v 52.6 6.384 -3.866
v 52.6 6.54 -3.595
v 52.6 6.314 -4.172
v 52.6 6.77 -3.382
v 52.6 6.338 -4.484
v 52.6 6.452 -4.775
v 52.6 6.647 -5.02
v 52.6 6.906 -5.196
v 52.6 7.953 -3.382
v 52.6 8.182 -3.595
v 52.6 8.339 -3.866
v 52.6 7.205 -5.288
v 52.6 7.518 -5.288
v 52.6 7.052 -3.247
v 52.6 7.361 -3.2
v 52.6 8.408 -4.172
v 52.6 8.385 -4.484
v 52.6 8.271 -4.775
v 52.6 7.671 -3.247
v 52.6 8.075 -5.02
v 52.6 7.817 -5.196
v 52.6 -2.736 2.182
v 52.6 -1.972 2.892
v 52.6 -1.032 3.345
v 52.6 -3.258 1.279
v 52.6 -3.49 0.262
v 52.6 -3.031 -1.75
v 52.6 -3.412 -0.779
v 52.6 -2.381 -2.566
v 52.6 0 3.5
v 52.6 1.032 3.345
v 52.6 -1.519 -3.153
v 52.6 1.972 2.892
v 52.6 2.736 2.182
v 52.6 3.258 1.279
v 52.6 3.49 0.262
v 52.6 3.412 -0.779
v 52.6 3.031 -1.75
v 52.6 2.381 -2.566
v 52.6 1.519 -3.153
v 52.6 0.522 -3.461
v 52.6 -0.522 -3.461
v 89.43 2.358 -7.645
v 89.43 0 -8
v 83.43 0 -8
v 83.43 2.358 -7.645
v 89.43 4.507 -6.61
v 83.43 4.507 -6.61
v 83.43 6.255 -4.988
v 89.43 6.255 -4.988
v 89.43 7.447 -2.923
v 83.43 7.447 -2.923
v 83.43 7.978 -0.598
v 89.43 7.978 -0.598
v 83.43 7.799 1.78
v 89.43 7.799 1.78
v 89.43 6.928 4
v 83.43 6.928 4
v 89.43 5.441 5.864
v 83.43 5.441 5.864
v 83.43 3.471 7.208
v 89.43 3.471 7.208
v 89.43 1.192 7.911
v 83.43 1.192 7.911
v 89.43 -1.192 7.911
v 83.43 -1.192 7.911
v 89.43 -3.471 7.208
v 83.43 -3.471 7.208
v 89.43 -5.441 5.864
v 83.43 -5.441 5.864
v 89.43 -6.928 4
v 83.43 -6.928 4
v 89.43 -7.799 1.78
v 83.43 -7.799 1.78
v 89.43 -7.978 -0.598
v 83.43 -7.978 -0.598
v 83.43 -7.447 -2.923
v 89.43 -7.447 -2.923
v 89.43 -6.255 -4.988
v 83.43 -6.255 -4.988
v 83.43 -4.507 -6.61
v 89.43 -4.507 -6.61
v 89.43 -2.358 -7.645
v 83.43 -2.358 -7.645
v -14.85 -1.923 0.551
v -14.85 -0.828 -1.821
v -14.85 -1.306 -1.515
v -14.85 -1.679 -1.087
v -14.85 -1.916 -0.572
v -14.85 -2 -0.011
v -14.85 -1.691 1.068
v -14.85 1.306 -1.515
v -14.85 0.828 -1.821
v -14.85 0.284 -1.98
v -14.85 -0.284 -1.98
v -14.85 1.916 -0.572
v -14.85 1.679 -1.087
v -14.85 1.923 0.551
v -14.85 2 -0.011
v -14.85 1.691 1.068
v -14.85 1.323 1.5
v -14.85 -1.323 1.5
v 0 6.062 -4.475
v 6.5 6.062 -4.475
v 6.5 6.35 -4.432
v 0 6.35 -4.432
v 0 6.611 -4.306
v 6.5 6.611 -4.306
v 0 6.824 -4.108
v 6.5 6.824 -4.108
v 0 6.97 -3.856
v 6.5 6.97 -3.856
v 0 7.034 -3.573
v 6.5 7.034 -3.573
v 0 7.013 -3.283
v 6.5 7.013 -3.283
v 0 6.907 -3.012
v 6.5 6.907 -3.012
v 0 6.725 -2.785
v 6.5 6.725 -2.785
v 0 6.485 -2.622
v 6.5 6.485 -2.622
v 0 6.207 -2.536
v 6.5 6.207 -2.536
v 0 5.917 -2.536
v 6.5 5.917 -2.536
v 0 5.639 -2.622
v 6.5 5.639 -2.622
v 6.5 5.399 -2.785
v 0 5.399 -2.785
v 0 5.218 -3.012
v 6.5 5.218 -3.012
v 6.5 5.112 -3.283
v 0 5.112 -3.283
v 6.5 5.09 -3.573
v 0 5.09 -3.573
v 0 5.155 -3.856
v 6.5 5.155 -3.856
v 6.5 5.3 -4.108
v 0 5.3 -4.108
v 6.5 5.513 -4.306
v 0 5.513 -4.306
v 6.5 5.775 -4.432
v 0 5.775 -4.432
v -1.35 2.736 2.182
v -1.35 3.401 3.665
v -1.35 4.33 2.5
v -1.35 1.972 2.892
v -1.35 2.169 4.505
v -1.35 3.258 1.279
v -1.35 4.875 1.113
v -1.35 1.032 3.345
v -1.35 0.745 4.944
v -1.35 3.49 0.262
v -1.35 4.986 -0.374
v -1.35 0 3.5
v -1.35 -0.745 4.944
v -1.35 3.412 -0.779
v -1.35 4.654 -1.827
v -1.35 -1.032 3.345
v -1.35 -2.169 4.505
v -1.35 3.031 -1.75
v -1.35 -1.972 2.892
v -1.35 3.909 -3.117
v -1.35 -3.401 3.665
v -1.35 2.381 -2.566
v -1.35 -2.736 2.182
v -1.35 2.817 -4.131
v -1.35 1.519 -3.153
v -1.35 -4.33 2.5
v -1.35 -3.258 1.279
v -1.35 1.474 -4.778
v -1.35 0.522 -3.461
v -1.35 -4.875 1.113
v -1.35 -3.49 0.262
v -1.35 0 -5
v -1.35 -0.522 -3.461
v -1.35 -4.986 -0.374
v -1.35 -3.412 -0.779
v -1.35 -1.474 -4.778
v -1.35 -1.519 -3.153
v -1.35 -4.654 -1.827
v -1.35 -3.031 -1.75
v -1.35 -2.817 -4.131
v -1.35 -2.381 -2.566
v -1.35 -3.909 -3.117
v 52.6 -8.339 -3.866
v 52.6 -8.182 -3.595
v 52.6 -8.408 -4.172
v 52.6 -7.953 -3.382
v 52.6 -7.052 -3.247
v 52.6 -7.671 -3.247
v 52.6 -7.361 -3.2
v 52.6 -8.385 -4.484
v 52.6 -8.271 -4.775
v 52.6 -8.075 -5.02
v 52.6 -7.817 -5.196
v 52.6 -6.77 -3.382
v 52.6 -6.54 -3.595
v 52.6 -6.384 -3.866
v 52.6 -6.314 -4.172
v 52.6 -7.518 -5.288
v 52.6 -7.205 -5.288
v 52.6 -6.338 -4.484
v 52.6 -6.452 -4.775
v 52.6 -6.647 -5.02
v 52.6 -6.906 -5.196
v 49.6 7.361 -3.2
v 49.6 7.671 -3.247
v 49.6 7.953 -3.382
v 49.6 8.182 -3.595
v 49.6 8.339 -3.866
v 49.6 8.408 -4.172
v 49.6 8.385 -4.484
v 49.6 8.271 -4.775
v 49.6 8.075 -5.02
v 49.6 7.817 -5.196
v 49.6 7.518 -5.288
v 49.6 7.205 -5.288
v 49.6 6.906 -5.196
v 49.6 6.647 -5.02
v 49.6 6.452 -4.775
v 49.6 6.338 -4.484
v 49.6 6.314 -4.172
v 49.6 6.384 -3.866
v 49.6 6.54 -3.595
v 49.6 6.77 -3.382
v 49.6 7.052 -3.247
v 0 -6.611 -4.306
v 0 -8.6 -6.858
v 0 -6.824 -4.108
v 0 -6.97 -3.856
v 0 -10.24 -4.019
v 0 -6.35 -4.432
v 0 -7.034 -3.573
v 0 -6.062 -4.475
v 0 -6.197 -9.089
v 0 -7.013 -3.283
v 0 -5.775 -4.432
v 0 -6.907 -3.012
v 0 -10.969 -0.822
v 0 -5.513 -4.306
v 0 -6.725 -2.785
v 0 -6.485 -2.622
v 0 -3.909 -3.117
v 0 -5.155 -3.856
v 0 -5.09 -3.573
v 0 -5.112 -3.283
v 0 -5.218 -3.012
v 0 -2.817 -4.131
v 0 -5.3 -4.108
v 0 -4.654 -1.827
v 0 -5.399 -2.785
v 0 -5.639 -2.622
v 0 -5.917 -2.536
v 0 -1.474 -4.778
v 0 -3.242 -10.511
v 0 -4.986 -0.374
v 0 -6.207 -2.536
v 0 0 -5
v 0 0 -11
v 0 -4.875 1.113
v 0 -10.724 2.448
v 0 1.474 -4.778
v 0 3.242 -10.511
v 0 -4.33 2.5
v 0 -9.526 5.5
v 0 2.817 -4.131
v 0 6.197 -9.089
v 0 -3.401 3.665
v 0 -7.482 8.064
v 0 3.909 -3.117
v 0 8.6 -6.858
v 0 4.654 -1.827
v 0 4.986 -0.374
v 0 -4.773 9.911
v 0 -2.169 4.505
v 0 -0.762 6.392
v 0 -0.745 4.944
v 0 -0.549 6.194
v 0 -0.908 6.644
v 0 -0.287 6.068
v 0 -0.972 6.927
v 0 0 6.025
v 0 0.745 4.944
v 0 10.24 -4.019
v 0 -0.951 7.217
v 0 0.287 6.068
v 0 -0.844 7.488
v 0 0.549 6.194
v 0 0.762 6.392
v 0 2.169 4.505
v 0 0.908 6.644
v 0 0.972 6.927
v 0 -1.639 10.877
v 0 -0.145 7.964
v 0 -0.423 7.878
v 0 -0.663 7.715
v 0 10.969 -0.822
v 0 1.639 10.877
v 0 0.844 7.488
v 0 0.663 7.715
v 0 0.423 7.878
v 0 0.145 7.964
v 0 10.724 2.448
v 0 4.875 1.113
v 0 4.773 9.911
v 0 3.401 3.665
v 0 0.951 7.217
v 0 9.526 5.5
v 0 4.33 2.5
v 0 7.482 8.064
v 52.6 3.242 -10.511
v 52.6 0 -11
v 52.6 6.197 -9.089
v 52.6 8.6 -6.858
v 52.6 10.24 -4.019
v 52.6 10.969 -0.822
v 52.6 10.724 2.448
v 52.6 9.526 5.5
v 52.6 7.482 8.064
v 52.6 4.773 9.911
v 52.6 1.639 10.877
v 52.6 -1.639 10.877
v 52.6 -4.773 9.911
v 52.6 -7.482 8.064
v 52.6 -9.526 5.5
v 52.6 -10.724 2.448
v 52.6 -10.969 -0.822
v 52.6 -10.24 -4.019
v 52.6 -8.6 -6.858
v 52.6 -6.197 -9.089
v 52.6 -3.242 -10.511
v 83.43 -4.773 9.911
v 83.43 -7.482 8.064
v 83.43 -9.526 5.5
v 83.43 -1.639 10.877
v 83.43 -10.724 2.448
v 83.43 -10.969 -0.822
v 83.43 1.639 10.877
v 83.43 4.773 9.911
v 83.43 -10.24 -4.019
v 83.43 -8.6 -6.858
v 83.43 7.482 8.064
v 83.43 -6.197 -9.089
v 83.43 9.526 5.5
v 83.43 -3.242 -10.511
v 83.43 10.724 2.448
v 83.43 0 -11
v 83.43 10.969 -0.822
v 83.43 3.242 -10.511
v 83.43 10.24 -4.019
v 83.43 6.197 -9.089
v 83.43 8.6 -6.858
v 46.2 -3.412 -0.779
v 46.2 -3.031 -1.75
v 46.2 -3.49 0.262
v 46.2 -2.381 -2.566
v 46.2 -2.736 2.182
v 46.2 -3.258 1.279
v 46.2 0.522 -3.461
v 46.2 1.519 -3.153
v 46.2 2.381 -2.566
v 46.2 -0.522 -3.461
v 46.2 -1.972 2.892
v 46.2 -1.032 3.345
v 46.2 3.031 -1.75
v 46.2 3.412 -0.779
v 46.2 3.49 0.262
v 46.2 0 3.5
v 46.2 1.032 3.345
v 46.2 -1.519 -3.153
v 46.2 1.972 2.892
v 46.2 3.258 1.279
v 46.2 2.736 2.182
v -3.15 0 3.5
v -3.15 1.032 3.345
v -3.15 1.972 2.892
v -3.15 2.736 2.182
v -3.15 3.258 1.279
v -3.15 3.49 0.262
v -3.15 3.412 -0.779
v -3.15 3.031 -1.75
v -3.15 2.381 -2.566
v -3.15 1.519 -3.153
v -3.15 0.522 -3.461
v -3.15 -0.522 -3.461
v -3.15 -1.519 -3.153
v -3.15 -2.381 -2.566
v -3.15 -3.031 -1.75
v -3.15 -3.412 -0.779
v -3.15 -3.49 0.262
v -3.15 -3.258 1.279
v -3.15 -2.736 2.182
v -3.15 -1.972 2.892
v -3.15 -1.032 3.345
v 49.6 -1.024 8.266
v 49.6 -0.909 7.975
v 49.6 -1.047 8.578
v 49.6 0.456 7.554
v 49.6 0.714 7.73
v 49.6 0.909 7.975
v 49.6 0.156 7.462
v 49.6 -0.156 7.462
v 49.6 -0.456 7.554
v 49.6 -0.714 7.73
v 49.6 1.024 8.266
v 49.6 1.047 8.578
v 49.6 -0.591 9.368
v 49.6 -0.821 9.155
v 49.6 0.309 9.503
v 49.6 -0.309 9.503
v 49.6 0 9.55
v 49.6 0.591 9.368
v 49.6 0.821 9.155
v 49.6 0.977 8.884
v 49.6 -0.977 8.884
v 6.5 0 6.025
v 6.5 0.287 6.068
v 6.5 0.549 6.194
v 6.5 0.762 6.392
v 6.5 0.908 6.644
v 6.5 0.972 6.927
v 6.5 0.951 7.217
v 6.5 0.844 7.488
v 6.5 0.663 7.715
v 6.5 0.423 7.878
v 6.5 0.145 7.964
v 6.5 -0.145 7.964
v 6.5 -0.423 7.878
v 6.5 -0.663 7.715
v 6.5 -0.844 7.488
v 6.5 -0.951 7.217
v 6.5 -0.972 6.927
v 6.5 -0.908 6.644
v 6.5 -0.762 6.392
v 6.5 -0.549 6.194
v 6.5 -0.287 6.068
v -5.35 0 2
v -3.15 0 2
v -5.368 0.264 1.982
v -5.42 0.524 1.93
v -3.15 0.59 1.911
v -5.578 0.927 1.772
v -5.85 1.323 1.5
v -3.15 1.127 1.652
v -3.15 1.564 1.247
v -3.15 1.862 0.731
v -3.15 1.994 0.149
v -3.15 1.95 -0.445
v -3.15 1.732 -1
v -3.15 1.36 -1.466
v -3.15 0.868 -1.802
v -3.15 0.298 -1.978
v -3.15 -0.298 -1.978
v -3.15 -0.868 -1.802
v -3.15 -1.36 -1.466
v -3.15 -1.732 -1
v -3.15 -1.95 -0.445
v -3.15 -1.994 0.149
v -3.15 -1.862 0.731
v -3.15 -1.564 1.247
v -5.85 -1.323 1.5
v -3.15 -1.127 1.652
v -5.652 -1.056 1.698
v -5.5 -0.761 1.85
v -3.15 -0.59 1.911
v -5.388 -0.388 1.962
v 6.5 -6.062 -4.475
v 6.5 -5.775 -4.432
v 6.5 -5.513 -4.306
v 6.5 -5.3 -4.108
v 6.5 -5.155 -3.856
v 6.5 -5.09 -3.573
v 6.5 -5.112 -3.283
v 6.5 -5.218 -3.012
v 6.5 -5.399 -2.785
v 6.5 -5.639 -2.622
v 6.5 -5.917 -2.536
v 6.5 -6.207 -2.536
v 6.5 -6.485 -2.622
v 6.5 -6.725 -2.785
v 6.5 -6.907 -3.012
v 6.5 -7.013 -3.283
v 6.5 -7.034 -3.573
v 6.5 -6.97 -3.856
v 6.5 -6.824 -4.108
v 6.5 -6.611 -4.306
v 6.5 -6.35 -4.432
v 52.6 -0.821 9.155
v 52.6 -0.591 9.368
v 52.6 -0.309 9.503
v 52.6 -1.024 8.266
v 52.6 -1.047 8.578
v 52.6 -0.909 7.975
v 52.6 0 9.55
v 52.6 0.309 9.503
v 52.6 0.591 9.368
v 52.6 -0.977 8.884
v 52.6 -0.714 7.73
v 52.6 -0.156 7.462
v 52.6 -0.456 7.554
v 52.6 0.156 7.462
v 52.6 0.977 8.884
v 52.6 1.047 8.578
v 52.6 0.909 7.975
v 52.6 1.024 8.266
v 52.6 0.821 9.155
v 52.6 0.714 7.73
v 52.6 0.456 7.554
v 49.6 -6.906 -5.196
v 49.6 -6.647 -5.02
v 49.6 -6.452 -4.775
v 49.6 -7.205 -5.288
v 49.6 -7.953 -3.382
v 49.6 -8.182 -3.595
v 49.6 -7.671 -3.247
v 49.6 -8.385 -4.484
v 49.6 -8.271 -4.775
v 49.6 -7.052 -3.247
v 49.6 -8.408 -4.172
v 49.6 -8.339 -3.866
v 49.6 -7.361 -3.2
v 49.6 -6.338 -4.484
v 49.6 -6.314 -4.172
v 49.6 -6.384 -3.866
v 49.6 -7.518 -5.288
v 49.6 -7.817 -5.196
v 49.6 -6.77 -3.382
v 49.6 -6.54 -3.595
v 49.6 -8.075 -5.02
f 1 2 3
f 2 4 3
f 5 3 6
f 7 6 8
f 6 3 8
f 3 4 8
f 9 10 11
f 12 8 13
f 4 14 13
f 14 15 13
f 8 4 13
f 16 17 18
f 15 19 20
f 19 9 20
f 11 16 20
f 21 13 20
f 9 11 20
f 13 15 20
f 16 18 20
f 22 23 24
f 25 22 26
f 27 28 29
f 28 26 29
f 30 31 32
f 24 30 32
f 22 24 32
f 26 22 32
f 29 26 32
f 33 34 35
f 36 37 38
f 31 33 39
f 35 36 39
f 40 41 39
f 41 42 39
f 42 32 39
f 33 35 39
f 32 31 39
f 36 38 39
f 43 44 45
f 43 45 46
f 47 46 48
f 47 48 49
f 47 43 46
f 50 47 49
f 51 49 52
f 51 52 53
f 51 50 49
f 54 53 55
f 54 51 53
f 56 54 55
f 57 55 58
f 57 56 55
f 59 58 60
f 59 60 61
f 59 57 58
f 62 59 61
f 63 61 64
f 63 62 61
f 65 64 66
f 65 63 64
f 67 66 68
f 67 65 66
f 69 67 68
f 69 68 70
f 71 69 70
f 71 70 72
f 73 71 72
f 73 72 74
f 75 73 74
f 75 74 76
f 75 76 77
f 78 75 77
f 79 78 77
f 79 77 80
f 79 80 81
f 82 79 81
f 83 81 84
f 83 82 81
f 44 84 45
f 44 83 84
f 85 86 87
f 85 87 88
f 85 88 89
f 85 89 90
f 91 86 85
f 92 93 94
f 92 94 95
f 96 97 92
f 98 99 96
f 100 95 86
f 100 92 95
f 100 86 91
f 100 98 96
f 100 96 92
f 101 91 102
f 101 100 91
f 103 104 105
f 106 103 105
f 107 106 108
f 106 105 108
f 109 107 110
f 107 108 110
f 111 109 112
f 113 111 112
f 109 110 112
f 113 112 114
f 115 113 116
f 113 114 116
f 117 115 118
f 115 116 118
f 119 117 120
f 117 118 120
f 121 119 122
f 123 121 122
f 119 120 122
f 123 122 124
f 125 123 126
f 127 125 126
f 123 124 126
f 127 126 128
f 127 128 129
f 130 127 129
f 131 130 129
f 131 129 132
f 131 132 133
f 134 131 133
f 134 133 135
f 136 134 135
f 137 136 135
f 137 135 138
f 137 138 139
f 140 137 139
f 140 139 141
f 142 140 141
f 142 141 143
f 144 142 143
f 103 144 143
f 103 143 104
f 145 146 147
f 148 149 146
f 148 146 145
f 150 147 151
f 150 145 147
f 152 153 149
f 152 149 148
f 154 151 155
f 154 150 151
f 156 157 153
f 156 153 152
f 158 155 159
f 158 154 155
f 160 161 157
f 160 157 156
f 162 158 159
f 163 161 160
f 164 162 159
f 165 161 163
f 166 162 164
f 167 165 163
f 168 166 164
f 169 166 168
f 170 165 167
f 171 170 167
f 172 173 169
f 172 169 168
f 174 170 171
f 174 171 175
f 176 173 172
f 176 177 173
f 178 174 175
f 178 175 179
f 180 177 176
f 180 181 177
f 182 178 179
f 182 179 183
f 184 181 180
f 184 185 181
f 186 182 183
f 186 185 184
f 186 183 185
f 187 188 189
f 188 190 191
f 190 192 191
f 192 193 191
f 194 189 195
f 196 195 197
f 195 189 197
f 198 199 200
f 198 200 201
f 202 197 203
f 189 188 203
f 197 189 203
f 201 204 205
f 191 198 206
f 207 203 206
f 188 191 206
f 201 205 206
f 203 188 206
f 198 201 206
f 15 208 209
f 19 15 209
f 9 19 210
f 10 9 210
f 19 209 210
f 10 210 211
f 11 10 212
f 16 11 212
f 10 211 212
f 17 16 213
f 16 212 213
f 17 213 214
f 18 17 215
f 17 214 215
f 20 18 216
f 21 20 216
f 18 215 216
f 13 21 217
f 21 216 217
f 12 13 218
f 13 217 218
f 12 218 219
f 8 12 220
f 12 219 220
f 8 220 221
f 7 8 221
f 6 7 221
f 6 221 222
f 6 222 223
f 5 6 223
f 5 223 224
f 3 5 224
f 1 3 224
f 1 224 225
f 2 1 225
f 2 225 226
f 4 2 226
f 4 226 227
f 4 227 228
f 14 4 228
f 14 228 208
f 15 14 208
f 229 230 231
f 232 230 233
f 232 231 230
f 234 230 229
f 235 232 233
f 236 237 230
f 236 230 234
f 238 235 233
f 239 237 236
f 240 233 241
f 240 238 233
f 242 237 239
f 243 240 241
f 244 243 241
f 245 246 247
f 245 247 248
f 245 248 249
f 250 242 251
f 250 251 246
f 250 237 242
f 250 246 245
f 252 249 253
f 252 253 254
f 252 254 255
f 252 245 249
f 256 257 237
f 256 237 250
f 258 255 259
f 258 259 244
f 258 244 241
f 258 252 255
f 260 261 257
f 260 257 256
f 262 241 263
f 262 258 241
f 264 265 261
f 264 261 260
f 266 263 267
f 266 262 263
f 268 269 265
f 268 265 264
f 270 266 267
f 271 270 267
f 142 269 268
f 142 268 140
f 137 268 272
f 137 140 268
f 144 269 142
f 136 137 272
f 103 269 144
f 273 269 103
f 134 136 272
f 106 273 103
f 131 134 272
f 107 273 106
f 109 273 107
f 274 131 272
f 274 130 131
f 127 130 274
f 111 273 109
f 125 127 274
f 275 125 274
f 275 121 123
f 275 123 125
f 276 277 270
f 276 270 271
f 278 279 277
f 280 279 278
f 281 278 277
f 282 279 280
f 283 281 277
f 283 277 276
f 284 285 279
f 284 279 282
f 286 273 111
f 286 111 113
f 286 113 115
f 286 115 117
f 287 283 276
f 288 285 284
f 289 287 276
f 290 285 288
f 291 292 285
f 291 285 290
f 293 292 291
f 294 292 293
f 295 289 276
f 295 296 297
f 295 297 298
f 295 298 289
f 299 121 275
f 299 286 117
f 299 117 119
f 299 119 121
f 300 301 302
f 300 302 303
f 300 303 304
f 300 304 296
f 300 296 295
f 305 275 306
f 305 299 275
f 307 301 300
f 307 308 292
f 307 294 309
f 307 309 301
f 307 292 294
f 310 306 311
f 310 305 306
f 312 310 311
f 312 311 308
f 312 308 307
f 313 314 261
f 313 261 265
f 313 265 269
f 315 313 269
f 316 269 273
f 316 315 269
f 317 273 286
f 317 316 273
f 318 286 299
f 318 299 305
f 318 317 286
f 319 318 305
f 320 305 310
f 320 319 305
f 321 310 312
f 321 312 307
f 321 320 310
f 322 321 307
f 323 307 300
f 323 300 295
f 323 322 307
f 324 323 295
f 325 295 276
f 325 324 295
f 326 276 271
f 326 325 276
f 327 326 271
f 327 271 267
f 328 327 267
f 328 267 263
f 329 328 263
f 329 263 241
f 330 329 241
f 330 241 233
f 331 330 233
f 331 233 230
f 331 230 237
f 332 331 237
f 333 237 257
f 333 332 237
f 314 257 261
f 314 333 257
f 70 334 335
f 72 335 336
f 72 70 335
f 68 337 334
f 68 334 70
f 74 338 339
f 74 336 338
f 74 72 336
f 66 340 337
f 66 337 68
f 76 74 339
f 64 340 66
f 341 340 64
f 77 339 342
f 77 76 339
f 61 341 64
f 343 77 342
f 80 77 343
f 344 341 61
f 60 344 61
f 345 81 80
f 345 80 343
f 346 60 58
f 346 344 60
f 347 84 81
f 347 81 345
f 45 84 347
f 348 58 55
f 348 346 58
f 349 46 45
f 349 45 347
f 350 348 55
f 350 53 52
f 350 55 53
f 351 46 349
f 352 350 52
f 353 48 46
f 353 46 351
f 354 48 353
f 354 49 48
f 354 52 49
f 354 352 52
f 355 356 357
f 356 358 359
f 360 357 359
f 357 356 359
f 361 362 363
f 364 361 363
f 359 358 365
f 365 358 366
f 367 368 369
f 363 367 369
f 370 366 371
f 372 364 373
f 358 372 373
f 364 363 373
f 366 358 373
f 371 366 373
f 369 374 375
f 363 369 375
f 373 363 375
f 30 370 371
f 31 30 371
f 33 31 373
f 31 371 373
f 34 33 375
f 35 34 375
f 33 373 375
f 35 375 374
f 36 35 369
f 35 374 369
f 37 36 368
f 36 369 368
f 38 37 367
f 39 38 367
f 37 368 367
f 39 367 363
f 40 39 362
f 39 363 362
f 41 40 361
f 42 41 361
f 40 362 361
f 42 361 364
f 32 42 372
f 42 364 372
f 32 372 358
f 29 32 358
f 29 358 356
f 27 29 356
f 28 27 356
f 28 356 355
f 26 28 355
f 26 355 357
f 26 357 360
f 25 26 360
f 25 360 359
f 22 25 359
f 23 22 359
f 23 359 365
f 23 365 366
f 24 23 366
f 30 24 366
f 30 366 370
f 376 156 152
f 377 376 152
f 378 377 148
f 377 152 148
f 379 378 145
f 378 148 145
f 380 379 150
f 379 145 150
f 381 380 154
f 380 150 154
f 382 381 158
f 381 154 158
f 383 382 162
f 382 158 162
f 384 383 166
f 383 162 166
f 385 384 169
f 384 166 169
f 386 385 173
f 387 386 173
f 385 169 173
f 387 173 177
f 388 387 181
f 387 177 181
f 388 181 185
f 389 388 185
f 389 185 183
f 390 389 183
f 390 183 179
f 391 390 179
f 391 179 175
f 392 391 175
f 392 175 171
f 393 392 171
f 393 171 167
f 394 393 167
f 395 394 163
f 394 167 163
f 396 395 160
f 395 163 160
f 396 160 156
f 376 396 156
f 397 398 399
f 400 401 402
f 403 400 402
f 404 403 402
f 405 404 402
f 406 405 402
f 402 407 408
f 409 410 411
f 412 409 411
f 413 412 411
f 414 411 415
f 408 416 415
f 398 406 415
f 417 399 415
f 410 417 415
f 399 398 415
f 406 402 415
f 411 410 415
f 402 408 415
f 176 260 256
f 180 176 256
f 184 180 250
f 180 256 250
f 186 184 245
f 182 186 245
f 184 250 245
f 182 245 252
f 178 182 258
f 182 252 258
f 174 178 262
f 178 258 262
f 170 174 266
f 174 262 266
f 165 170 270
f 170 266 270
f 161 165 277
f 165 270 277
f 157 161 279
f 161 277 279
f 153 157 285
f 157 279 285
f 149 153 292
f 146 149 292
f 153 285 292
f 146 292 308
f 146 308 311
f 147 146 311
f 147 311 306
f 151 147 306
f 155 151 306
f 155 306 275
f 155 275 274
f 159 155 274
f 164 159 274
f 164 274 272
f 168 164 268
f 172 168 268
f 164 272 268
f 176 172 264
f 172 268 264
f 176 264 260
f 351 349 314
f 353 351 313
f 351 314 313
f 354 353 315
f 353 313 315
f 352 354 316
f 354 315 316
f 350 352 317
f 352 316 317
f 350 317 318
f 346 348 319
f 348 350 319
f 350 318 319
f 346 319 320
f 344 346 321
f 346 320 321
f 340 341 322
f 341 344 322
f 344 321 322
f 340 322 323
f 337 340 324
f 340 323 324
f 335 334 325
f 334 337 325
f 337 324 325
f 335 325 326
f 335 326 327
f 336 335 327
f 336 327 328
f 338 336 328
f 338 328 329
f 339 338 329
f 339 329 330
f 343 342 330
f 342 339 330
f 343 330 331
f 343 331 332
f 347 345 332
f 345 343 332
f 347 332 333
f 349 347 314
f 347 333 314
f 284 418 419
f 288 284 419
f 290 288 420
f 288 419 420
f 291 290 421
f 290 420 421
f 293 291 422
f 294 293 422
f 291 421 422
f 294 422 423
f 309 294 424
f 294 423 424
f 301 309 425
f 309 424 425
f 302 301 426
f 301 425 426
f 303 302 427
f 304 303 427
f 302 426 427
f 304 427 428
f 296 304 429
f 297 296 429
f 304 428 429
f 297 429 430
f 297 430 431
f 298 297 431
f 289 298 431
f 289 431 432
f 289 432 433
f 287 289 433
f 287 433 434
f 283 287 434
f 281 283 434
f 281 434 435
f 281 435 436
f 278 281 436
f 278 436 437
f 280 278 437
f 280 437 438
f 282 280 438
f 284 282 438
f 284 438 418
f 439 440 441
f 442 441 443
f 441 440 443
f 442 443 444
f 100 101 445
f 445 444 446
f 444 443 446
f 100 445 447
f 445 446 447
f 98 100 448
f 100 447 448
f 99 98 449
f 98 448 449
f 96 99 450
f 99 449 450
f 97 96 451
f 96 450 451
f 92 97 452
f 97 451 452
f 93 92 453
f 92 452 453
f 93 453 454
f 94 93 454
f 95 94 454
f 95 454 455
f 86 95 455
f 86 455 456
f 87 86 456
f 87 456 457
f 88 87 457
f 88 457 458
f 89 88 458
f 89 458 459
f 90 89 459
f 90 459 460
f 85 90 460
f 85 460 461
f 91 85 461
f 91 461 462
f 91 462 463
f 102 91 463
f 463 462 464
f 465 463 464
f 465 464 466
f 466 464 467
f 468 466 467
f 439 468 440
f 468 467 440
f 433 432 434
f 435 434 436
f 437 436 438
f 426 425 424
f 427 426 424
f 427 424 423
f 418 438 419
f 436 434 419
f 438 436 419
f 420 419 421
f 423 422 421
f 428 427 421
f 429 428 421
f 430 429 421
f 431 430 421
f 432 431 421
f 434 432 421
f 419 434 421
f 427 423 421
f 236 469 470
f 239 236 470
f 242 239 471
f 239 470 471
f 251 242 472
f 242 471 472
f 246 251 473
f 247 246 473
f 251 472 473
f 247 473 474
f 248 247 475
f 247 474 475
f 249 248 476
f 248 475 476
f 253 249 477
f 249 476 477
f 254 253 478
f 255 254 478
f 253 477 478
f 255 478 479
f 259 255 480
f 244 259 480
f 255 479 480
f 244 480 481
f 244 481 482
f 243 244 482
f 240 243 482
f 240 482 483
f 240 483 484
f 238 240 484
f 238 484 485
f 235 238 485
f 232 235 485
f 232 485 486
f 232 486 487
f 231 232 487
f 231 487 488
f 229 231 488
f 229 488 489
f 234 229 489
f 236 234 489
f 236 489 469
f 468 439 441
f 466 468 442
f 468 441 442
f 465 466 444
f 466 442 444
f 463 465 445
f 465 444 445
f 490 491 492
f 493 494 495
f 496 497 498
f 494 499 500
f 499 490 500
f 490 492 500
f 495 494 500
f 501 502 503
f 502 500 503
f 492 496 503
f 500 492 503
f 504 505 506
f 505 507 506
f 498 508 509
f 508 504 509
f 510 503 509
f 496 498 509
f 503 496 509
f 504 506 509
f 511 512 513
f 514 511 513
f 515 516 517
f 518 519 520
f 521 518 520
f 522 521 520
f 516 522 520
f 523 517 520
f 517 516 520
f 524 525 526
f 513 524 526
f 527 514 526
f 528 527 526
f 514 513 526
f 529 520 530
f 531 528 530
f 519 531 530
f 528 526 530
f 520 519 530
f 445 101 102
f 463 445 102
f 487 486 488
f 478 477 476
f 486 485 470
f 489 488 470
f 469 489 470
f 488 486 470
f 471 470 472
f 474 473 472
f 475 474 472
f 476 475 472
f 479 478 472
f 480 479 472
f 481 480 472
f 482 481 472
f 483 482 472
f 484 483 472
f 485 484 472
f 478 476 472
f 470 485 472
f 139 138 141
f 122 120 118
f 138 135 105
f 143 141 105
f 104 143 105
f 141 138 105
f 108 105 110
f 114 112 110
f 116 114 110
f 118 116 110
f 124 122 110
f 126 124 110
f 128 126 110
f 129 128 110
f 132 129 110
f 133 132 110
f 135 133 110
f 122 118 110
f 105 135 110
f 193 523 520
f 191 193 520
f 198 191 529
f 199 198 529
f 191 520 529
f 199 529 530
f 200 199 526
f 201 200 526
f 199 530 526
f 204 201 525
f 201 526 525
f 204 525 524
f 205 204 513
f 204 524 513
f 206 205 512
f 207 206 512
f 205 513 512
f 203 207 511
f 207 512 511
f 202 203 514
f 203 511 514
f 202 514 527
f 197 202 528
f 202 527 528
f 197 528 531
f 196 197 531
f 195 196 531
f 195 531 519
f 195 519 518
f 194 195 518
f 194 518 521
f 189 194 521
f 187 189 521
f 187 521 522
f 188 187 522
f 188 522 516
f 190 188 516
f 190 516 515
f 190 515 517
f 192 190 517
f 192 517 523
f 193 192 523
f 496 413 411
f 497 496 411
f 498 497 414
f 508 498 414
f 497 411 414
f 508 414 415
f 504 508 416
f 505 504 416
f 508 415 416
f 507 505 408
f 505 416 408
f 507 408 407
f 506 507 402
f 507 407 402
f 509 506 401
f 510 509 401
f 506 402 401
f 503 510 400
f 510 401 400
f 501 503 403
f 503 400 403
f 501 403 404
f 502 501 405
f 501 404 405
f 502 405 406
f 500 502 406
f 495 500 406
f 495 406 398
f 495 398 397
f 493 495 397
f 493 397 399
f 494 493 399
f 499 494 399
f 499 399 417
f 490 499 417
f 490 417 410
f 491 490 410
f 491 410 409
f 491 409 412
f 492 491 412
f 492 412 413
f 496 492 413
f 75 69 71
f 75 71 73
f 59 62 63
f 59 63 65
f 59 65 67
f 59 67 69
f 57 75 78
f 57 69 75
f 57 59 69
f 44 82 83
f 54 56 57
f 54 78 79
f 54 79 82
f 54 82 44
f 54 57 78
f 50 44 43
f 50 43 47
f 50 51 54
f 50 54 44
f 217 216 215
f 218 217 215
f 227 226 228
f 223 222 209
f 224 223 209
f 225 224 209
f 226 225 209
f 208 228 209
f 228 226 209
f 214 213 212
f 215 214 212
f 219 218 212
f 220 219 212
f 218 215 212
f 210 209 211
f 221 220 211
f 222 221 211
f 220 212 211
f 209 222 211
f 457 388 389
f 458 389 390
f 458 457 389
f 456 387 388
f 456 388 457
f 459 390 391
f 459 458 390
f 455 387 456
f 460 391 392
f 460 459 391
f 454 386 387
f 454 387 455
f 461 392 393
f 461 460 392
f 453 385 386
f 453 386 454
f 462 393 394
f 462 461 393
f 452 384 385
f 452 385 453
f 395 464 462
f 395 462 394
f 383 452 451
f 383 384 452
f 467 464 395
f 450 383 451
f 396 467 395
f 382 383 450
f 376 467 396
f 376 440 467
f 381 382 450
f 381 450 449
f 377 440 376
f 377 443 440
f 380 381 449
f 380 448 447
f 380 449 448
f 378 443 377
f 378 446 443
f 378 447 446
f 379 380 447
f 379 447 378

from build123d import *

# Parameters (mm, degrees)
SKETCH1_W           = 52.6
SKETCH1_H           = 11
SKETCH2_R           = 5
BOSS_EXTRUDE1_DEPTH = 1.35
SKETCH3_R           = 3.5
BOSS_EXTRUDE2_DEPTH = 1.8
SKETCH4_R           = 2
BOSS_EXTRUDE3_DEPTH = 11.7
CUT_EXTRUDE1_REACH  = 71.221
HOLE1_D             = 1.95
HOLE1_DEPTH         = 6.5
HOLE2_D             = 1.95
HOLE2_DEPTH         = 6.5
HOLE3_D             = 1.95
HOLE3_DEPTH         = 6.5
HOLE4_D             = 7
HOLE4_DEPTH         = 6.4
HOLE5_D             = 2.1
HOLE5_DEPTH         = 3
HOLE6_D             = 2.1
HOLE6_DEPTH         = 3
HOLE7_D             = 2.1
HOLE7_DEPTH         = 3
SKETCH25_R          = 11
BOSS_EXTRUDE4_DEPTH = 36.83
SKETCH26_R          = 12
SKETCH26_R_2        = 8
CUT_EXTRUDE2_DEPTH  = 6


with BuildPart() as part:
    # Sketch1 → Revolve1 (revolve)
    with BuildSketch(Plane.XY, mode=Mode.PRIVATE) as revolve1_sk:
        with Locations((26.3, 5.5)):
            Rectangle(SKETCH1_W, SKETCH1_H)
    revolve(revolve1_sk.sketch.rotate(Axis((0, 0, 0), (1, 0, 0)), 270), axis=Axis((0, 0, 0), (1, 0, 0)))

    # Sketch2 → Boss-Extrude1 (add)
    with BuildSketch(Plane.ZY):
        with Locations(Location((0, 0, 0), (0, 0, 180))):
            Circle(SKETCH2_R)
    extrude(amount=BOSS_EXTRUDE1_DEPTH)

    # Sketch3 → Boss-Extrude2 (add)
    with BuildSketch(Plane.ZY.offset(1.35)):
        Circle(SKETCH3_R)
    extrude(amount=BOSS_EXTRUDE2_DEPTH)

    # Sketch4 → Boss-Extrude3 (add)
    with BuildSketch(Plane.ZY.offset(3.15)):
        Circle(SKETCH4_R)
    extrude(amount=BOSS_EXTRUDE3_DEPTH)

    # Cut-Extrude1: up to this plane
    cut_extrude1_end = Plane(origin=(-3.675, 0, 3.675), z_dir=(0.707106781186547, 0, -0.707106781186548))
    # Sketch6 → Cut-Extrude1 (cut, up to the surface)
    with BuildSketch(Plane.ZY.offset(14.85), mode=Mode.PRIVATE) as cut_extrude1_sk1:
        with BuildLine():
            Line((1.5, 1.322875656), (1.5, -1.322875656))
            ThreePointArc((1.5, -1.322875656), (2, 0), (1.5, 1.322875656))
        make_face()
    cut_extrude1_tool1 = split(extrude(cut_extrude1_sk1.sketch, amount=-CUT_EXTRUDE1_REACH, mode=Mode.PRIVATE), bisect_by=cut_extrude1_end, keep=Keep.BOTH, mode=Mode.PRIVATE)
    add(cut_extrude1_tool1.solids().sort_by_distance((-14.85, 0, 1.702311))[0], mode=Mode.SUBTRACT)

    # Hole1
    with Locations(Plane.ZY):
        with Locations((7, 0)):
            Hole(HOLE1_D / 2, depth=HOLE1_DEPTH)

    # Hole2
    with Locations(Plane.ZY):
        with Locations((-3.5, -6.062177826)):
            Hole(HOLE2_D / 2, depth=HOLE2_DEPTH)

    # Hole3
    with Locations(Plane.ZY):
        with Locations((-3.5, 6.062177826)):
            Hole(HOLE3_D / 2, depth=HOLE3_DEPTH)

    # Hole4
    with Locations(Plane(origin=(52.6, 0, 0), x_dir=(0, 0, -1), z_dir=(1, 0, 0))):
        with Locations((0, 0)):
            Hole(HOLE4_D / 2, depth=HOLE4_DEPTH)

    # Hole5
    with Locations(Plane(origin=(52.6, 0, 0), x_dir=(0, 0, -1), z_dir=(1, 0, 0))):
        with Locations((-8.5, 0)):
            Hole(HOLE5_D / 2, depth=HOLE5_DEPTH)

    # Hole6
    with Locations(Plane(origin=(52.6, 0, 0), x_dir=(0, 0, -1), z_dir=(1, 0, 0))):
        with Locations((4.25, -7.361215932)):
            Hole(HOLE6_D / 2, depth=HOLE6_DEPTH)

    # Hole7
    with Locations(Plane(origin=(52.6, 0, 0), x_dir=(0, 0, -1), z_dir=(1, 0, 0))):
        with Locations((4.25, 7.361215932)):
            Hole(HOLE7_D / 2, depth=HOLE7_DEPTH)

    # Sketch25 → Boss-Extrude4 (add)
    with BuildSketch(Plane(origin=(52.6, 0, 0), x_dir=(0, 0, -1), z_dir=(1, 0, 0))):
        Circle(SKETCH25_R)
    extrude(amount=BOSS_EXTRUDE4_DEPTH)

    # Sketch26 → Cut-Extrude2 (cut)
    with BuildSketch(Plane(origin=(89.43, 0, 0), x_dir=(0, 0, -1), z_dir=(1, 0, 0))):
        Circle(SKETCH26_R)
        Circle(SKETCH26_R_2, mode=Mode.SUBTRACT)
    extrude(amount=-CUT_EXTRUDE2_DEPTH, mode=Mode.SUBTRACT)


solid = part.part
